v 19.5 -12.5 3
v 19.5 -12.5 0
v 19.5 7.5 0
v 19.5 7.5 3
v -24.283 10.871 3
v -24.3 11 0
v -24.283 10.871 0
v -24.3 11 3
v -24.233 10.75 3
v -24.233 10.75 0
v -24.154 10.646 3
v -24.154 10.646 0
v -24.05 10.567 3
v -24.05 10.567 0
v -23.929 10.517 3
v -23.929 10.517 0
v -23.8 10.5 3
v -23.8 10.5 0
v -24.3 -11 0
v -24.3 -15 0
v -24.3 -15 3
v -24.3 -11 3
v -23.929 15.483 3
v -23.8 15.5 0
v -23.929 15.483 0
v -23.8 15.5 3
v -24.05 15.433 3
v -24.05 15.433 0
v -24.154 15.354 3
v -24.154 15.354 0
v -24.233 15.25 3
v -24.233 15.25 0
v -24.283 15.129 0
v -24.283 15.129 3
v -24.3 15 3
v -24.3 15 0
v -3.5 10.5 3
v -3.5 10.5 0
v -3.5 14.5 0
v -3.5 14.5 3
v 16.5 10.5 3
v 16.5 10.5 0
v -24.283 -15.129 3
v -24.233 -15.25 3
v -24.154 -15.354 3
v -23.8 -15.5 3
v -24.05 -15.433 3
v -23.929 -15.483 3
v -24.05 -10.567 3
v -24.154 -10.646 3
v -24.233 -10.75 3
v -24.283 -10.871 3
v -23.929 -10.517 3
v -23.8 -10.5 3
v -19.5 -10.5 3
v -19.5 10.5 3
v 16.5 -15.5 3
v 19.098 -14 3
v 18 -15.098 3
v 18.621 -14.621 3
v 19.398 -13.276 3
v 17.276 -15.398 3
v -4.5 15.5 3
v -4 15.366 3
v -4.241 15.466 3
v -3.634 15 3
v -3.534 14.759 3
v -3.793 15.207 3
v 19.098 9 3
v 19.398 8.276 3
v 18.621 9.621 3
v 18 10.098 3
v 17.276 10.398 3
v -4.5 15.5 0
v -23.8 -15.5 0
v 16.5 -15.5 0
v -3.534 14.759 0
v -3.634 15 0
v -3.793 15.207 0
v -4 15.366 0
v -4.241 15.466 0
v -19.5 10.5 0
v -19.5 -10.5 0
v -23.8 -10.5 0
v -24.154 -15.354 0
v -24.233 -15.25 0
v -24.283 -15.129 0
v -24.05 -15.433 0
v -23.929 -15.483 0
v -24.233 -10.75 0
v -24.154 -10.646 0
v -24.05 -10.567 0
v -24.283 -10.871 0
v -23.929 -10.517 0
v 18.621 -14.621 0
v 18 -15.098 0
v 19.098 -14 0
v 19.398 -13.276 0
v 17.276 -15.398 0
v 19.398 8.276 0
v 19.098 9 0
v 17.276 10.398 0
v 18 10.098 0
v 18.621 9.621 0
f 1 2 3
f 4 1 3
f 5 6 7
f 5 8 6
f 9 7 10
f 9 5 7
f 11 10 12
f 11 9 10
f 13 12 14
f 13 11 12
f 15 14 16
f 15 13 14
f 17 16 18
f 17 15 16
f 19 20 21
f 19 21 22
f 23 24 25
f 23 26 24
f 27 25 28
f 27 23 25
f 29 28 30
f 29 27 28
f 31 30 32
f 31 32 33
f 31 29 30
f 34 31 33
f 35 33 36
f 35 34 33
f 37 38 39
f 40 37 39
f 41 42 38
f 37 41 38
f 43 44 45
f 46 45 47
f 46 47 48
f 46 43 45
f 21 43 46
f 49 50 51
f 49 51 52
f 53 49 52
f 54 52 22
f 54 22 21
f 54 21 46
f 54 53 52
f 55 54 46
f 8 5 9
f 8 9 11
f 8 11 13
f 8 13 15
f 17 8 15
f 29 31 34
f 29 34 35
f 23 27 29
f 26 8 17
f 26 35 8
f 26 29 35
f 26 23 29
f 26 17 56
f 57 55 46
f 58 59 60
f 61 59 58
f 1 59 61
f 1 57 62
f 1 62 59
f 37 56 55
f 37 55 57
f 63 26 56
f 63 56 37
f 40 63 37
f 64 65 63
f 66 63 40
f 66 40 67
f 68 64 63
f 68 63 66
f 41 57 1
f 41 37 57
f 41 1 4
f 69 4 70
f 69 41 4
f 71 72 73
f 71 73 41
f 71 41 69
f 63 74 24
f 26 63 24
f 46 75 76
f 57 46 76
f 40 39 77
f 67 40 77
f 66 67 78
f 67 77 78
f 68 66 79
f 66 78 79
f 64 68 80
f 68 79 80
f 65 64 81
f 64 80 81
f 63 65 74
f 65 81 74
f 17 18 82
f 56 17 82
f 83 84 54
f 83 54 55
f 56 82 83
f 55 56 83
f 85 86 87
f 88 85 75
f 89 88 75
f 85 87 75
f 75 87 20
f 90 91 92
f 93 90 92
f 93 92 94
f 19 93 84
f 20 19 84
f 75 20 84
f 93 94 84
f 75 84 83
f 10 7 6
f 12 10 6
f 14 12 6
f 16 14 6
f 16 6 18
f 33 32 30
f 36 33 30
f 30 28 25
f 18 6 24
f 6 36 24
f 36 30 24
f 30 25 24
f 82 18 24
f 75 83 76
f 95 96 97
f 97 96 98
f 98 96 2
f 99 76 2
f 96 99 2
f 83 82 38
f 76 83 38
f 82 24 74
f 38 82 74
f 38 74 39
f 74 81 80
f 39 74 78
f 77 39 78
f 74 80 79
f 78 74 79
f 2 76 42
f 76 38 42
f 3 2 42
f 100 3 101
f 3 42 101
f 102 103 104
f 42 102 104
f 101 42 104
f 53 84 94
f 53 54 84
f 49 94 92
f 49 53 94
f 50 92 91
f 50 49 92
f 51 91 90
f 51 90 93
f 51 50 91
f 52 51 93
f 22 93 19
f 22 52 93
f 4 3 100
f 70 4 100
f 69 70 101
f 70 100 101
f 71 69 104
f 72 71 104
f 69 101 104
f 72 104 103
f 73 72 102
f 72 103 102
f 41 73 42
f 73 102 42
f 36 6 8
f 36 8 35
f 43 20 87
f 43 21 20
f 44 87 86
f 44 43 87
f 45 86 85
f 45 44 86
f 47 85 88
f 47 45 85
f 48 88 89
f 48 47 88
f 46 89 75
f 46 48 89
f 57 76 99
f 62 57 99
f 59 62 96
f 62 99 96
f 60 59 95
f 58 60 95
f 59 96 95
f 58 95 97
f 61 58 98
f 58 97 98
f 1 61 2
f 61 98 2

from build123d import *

# Parameters (mm, degrees)
SKETCH_1_W      = 4.8
SKETCH_1_H      = 5
EXTRUDE_1_DEPTH = 3
FILLET_1_R      = 0.5


with BuildPart() as part:
    # Эскиз1 → Бобышка-Вытянуть1 (new body)
    with BuildSketch(Plane.XY):
        with BuildLine():
            Line((-4.5, 15.5), (-19.5, 15.5))
            Line((-19.5, 15.5), (-19.5, 10.5))
            Line((-19.5, 10.5), (-19.5, -10.5))
            Line((-19.5, -10.5), (-19.5, -15.5))
            Line((-19.5, -15.5), (16.5, -15.5))
            ThreePointArc((16.5, -15.5), (18.621320344, -14.621320344), (19.5, -12.5))
            Line((19.5, -12.5), (19.5, 7.5))
            ThreePointArc((19.5, 7.5), (18.621320344, 9.621320344), (16.5, 10.5))
            Line((16.5, 10.5), (-3.5, 10.5))
            Line((-3.5, 10.5), (-3.5, 14.5))
            ThreePointArc((-3.5, 14.5), (-3.792893219, 15.207106781), (-4.5, 15.5))
        make_face()
        with Locations((-21.9, -13)):
            Rectangle(SKETCH_1_W, SKETCH_1_H)
        with Locations((-21.9, 13)):
            Rectangle(SKETCH_1_W, SKETCH_1_H)
    extrude(amount=EXTRUDE_1_DEPTH)

    # Скругление1
    fillet_1_edges = [part.edges().sort_by_distance(p)[0] for p in [
        (-24.3, -15.5, 1.5),
        (-24.3, -10.5, 1.5),
        (-24.3, 15.5, 1.5),
        (-24.3, 10.5, 1.5),
    ]]
    fillet(fillet_1_edges, radius=FILLET_1_R)


solid = part.part
